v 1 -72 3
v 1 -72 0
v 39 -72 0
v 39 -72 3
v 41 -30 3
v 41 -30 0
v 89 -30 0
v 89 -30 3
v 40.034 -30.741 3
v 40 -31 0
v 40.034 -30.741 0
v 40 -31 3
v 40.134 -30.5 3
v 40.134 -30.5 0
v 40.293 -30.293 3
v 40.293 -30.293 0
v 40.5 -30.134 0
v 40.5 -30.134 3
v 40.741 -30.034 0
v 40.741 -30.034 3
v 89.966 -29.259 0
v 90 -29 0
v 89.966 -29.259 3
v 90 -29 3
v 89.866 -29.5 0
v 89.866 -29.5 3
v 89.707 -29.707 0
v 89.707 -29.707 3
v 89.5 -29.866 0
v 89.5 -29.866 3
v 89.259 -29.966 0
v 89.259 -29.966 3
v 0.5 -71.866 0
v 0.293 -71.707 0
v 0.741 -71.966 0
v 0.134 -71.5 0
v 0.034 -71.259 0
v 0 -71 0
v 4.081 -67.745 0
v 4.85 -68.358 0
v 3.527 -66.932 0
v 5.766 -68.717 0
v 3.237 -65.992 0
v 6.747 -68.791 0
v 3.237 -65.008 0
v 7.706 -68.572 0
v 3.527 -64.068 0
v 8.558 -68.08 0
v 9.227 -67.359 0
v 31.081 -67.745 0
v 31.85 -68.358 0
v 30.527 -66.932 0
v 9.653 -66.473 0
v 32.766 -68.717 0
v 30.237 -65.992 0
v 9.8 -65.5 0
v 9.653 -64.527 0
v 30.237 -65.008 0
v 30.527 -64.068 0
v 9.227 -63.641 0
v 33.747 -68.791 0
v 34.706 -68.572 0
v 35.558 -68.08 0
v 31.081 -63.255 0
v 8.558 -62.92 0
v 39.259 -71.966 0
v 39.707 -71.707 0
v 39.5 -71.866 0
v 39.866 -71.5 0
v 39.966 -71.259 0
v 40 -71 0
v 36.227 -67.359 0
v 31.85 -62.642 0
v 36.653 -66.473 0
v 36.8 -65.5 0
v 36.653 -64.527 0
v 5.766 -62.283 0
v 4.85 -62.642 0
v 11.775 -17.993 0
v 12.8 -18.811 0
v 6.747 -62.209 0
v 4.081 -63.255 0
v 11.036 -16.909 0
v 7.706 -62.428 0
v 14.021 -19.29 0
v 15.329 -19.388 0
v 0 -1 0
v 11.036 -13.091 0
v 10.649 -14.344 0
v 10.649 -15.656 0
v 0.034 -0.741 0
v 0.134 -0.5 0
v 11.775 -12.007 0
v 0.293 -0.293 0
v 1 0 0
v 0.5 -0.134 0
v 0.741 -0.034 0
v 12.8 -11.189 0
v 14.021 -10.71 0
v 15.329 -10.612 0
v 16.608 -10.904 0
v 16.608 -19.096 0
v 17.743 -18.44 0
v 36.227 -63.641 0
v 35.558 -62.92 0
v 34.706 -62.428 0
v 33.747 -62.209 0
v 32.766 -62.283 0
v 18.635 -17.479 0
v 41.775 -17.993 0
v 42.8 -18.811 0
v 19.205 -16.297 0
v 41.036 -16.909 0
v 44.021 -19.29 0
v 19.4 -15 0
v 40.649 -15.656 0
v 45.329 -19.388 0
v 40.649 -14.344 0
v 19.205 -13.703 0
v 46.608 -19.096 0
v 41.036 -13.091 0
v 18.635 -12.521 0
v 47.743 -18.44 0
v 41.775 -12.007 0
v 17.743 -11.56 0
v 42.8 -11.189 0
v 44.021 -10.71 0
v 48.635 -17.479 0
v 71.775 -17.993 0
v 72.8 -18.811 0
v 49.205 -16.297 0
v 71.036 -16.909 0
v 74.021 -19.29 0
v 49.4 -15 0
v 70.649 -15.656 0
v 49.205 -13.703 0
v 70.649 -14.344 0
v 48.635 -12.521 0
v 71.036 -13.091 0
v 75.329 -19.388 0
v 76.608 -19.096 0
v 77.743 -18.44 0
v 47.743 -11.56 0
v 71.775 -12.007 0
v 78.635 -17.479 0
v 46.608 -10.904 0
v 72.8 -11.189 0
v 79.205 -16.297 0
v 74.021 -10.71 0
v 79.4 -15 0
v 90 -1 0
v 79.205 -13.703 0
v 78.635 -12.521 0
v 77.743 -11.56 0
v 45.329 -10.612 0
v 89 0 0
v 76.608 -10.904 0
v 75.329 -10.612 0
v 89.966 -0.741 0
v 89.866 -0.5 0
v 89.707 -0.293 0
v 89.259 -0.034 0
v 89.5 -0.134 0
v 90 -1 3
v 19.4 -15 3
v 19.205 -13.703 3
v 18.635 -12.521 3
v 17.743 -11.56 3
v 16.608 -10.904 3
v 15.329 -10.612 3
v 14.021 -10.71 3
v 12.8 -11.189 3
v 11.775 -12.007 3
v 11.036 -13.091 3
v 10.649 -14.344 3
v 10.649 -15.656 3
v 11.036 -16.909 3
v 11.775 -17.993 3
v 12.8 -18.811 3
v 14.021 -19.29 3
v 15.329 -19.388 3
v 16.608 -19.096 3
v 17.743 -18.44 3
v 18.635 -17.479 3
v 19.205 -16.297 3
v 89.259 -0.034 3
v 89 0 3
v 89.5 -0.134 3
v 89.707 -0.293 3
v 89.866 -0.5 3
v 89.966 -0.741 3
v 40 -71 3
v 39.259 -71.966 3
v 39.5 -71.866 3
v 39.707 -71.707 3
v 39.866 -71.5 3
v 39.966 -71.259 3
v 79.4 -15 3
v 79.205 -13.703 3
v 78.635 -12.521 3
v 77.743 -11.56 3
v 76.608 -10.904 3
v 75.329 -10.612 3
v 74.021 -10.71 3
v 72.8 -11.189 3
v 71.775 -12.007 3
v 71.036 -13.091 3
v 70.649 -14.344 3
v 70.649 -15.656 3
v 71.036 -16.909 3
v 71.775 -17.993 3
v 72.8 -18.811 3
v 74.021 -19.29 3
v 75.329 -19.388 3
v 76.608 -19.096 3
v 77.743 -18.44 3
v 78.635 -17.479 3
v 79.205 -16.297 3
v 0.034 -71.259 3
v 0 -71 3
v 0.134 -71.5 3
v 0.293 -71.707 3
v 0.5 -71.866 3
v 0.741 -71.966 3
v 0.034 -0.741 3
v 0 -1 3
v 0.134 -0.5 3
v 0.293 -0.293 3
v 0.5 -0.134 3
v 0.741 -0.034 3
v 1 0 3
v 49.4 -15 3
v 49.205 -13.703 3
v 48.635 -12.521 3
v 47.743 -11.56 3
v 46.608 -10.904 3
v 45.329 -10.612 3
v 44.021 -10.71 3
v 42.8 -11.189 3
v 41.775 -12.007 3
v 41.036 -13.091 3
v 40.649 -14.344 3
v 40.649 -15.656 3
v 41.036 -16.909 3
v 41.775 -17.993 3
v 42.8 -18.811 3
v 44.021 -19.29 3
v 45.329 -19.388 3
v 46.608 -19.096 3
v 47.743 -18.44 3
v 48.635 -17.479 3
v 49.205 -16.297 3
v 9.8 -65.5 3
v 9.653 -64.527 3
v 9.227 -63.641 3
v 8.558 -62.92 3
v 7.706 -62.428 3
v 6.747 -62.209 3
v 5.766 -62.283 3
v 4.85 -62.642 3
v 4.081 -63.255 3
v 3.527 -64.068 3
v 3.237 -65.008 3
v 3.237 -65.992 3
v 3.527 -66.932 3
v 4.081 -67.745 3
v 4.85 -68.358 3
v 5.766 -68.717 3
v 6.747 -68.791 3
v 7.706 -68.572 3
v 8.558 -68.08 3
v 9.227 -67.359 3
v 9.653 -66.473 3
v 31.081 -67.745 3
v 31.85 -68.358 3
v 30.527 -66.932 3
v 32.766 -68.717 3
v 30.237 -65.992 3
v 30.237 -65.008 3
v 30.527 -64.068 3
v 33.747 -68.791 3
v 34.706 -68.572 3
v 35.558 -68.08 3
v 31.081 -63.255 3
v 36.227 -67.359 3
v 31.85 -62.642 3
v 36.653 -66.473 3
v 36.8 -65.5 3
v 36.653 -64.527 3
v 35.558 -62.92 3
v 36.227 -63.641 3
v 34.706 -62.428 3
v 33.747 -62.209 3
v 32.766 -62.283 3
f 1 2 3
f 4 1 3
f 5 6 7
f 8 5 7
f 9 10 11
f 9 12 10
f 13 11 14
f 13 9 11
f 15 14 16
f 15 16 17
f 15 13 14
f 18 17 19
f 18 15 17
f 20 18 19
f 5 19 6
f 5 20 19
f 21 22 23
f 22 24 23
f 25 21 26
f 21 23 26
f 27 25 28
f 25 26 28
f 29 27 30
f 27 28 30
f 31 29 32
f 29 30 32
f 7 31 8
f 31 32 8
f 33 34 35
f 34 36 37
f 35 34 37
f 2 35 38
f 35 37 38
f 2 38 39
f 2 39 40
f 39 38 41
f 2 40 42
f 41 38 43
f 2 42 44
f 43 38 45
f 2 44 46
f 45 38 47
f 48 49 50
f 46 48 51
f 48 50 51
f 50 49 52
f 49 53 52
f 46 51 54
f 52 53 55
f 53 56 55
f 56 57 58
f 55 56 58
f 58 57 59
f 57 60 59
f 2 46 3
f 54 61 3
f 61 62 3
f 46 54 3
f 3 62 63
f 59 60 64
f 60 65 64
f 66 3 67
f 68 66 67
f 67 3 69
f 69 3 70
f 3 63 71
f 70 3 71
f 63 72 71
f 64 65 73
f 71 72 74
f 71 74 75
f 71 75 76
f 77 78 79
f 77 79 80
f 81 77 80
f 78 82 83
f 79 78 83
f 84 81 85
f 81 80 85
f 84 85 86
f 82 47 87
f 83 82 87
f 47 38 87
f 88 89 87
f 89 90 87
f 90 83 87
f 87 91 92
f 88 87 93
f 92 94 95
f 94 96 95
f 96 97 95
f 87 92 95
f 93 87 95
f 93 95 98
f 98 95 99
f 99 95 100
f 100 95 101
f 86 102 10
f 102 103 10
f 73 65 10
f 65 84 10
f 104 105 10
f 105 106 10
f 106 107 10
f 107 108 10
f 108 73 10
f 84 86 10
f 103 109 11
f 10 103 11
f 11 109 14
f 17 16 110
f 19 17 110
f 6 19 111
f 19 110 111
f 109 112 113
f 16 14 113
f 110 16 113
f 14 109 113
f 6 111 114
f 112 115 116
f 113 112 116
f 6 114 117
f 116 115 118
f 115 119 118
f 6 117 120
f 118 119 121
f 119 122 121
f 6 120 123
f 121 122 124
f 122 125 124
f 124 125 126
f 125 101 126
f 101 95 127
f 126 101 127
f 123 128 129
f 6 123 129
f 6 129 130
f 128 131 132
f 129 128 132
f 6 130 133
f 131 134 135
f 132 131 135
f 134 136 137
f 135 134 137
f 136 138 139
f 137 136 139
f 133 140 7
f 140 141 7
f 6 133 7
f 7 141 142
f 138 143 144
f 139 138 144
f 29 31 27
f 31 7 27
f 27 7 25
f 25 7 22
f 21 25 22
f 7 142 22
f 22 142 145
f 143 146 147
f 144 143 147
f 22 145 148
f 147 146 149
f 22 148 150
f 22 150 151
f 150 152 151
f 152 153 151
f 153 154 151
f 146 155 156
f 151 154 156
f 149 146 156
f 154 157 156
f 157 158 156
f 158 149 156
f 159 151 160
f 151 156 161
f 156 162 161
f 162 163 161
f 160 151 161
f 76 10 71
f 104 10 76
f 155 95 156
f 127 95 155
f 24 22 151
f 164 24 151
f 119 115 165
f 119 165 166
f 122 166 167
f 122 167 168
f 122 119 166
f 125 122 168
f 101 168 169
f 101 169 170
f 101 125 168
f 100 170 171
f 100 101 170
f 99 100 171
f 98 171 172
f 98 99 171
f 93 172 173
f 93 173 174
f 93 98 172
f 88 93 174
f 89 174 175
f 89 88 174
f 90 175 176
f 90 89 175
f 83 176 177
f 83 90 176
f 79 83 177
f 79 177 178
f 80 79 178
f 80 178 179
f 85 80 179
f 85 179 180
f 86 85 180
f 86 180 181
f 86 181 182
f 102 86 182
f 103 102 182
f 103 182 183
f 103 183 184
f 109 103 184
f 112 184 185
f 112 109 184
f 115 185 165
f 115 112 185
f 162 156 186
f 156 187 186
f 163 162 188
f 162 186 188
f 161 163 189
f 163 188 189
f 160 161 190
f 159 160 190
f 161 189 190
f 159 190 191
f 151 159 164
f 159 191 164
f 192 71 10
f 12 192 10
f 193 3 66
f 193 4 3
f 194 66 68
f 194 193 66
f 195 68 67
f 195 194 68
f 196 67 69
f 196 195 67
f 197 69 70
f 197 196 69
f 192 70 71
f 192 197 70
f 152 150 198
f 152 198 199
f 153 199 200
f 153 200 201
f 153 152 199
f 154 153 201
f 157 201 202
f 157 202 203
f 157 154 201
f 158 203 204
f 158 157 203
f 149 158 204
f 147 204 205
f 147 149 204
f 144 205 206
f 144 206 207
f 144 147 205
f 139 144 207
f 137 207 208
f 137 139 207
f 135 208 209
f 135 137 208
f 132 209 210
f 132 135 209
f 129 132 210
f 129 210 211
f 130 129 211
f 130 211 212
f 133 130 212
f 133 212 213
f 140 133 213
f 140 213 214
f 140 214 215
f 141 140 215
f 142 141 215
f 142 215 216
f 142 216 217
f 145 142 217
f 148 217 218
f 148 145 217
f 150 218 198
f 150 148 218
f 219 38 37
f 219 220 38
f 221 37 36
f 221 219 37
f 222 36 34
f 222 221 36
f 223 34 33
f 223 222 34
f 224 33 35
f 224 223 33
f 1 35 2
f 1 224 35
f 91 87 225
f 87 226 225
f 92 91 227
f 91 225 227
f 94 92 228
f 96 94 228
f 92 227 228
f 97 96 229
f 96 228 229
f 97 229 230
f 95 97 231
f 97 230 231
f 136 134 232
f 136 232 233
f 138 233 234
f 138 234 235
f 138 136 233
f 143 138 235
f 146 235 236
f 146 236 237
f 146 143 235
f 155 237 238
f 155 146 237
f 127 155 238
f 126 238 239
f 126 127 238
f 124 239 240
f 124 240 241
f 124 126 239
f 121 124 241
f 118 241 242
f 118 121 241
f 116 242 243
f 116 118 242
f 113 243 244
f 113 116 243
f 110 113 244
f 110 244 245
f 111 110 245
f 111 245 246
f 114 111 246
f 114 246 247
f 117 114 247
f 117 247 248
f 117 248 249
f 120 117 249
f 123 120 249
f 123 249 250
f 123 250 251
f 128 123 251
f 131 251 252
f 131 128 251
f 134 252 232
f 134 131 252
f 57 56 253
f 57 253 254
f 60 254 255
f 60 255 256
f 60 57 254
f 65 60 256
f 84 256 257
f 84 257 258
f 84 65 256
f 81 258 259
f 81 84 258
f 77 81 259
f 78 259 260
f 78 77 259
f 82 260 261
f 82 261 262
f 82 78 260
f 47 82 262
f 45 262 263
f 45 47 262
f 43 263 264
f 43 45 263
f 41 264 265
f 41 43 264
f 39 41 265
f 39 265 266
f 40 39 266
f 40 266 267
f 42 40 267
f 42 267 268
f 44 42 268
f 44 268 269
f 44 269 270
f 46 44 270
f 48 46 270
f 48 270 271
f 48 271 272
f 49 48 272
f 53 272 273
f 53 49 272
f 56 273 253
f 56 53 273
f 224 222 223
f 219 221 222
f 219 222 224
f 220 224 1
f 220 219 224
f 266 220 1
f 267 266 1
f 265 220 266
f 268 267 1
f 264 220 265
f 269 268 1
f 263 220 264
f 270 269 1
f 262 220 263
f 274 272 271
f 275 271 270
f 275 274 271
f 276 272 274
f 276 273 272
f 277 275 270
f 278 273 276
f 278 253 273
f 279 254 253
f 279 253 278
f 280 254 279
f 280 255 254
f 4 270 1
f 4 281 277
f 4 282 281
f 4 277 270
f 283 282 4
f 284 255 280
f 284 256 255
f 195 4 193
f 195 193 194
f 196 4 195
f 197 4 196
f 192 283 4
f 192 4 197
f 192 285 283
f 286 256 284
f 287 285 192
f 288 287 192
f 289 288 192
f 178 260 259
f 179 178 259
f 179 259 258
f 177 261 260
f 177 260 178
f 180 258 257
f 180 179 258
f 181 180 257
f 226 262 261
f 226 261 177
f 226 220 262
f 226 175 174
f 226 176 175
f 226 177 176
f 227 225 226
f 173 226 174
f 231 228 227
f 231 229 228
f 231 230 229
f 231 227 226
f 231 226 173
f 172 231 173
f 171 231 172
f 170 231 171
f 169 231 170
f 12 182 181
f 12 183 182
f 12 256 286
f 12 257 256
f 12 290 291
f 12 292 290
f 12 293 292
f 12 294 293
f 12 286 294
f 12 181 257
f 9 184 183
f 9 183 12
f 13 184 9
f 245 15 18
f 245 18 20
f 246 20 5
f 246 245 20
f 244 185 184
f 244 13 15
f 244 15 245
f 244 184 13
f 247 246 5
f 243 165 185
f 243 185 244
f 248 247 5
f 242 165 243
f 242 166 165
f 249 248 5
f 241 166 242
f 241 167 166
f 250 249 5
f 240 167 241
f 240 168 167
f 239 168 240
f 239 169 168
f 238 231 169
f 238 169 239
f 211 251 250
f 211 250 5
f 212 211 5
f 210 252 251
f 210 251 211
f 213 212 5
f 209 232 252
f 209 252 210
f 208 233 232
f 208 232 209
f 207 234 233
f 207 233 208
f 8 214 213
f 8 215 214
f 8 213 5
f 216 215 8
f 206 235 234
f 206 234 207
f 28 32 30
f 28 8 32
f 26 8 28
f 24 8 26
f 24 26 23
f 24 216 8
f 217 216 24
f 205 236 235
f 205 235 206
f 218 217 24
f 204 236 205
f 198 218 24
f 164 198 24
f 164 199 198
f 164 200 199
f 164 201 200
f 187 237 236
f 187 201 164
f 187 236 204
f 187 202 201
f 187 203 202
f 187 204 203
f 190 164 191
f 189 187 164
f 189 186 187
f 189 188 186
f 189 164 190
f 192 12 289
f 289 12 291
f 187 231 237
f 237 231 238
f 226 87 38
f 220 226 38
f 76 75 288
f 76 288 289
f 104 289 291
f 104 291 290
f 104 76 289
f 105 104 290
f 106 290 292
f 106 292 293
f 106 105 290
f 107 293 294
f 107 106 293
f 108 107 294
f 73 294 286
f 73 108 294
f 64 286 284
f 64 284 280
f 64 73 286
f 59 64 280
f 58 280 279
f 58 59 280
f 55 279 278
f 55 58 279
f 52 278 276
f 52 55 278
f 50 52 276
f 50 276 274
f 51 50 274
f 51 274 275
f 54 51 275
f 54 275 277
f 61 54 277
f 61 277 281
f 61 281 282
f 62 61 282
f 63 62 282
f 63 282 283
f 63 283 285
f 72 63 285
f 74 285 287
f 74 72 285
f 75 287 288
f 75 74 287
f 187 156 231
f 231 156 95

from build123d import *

# Parameters (mm, degrees)
SKETCH_1_R      = 3.3
SKETCH_1_R_2    = 4.4
EXTRUDE_1_DEPTH = 3
FILLET_1_R      = 1


with BuildPart() as part:
    # 草图1 → 凸台-拉伸1 (new body)
    with BuildSketch(Plane.XY):
        Polygon((0, 0), (0, -72), (40, -72), (40, -30), (90, -30), (90, 0), align=None)
        with Locations((33.5, -65.5)):
            Circle(SKETCH_1_R, mode=Mode.SUBTRACT)
        with Locations((6.5, -65.5)):
            Circle(SKETCH_1_R, mode=Mode.SUBTRACT)
        with Locations((45, -15)):
            Circle(SKETCH_1_R_2, mode=Mode.SUBTRACT)
        with Locations((75, -15)):
            Circle(SKETCH_1_R_2, mode=Mode.SUBTRACT)
        with Locations((15, -15)):
            Circle(SKETCH_1_R_2, mode=Mode.SUBTRACT)
    extrude(amount=EXTRUDE_1_DEPTH)

    # 圆角1
    fillet_1_edges = [part.edges().sort_by_distance(p)[0] for p in [
        (90, 0, 1.5),
        (90, -30, 1.5),
        (40, -30, 1.5),
        (40, -72, 1.5),
        (0, -72, 1.5),
        (0, 0, 1.5),
    ]]
    fillet(fillet_1_edges, radius=FILLET_1_R)


solid = part.part
